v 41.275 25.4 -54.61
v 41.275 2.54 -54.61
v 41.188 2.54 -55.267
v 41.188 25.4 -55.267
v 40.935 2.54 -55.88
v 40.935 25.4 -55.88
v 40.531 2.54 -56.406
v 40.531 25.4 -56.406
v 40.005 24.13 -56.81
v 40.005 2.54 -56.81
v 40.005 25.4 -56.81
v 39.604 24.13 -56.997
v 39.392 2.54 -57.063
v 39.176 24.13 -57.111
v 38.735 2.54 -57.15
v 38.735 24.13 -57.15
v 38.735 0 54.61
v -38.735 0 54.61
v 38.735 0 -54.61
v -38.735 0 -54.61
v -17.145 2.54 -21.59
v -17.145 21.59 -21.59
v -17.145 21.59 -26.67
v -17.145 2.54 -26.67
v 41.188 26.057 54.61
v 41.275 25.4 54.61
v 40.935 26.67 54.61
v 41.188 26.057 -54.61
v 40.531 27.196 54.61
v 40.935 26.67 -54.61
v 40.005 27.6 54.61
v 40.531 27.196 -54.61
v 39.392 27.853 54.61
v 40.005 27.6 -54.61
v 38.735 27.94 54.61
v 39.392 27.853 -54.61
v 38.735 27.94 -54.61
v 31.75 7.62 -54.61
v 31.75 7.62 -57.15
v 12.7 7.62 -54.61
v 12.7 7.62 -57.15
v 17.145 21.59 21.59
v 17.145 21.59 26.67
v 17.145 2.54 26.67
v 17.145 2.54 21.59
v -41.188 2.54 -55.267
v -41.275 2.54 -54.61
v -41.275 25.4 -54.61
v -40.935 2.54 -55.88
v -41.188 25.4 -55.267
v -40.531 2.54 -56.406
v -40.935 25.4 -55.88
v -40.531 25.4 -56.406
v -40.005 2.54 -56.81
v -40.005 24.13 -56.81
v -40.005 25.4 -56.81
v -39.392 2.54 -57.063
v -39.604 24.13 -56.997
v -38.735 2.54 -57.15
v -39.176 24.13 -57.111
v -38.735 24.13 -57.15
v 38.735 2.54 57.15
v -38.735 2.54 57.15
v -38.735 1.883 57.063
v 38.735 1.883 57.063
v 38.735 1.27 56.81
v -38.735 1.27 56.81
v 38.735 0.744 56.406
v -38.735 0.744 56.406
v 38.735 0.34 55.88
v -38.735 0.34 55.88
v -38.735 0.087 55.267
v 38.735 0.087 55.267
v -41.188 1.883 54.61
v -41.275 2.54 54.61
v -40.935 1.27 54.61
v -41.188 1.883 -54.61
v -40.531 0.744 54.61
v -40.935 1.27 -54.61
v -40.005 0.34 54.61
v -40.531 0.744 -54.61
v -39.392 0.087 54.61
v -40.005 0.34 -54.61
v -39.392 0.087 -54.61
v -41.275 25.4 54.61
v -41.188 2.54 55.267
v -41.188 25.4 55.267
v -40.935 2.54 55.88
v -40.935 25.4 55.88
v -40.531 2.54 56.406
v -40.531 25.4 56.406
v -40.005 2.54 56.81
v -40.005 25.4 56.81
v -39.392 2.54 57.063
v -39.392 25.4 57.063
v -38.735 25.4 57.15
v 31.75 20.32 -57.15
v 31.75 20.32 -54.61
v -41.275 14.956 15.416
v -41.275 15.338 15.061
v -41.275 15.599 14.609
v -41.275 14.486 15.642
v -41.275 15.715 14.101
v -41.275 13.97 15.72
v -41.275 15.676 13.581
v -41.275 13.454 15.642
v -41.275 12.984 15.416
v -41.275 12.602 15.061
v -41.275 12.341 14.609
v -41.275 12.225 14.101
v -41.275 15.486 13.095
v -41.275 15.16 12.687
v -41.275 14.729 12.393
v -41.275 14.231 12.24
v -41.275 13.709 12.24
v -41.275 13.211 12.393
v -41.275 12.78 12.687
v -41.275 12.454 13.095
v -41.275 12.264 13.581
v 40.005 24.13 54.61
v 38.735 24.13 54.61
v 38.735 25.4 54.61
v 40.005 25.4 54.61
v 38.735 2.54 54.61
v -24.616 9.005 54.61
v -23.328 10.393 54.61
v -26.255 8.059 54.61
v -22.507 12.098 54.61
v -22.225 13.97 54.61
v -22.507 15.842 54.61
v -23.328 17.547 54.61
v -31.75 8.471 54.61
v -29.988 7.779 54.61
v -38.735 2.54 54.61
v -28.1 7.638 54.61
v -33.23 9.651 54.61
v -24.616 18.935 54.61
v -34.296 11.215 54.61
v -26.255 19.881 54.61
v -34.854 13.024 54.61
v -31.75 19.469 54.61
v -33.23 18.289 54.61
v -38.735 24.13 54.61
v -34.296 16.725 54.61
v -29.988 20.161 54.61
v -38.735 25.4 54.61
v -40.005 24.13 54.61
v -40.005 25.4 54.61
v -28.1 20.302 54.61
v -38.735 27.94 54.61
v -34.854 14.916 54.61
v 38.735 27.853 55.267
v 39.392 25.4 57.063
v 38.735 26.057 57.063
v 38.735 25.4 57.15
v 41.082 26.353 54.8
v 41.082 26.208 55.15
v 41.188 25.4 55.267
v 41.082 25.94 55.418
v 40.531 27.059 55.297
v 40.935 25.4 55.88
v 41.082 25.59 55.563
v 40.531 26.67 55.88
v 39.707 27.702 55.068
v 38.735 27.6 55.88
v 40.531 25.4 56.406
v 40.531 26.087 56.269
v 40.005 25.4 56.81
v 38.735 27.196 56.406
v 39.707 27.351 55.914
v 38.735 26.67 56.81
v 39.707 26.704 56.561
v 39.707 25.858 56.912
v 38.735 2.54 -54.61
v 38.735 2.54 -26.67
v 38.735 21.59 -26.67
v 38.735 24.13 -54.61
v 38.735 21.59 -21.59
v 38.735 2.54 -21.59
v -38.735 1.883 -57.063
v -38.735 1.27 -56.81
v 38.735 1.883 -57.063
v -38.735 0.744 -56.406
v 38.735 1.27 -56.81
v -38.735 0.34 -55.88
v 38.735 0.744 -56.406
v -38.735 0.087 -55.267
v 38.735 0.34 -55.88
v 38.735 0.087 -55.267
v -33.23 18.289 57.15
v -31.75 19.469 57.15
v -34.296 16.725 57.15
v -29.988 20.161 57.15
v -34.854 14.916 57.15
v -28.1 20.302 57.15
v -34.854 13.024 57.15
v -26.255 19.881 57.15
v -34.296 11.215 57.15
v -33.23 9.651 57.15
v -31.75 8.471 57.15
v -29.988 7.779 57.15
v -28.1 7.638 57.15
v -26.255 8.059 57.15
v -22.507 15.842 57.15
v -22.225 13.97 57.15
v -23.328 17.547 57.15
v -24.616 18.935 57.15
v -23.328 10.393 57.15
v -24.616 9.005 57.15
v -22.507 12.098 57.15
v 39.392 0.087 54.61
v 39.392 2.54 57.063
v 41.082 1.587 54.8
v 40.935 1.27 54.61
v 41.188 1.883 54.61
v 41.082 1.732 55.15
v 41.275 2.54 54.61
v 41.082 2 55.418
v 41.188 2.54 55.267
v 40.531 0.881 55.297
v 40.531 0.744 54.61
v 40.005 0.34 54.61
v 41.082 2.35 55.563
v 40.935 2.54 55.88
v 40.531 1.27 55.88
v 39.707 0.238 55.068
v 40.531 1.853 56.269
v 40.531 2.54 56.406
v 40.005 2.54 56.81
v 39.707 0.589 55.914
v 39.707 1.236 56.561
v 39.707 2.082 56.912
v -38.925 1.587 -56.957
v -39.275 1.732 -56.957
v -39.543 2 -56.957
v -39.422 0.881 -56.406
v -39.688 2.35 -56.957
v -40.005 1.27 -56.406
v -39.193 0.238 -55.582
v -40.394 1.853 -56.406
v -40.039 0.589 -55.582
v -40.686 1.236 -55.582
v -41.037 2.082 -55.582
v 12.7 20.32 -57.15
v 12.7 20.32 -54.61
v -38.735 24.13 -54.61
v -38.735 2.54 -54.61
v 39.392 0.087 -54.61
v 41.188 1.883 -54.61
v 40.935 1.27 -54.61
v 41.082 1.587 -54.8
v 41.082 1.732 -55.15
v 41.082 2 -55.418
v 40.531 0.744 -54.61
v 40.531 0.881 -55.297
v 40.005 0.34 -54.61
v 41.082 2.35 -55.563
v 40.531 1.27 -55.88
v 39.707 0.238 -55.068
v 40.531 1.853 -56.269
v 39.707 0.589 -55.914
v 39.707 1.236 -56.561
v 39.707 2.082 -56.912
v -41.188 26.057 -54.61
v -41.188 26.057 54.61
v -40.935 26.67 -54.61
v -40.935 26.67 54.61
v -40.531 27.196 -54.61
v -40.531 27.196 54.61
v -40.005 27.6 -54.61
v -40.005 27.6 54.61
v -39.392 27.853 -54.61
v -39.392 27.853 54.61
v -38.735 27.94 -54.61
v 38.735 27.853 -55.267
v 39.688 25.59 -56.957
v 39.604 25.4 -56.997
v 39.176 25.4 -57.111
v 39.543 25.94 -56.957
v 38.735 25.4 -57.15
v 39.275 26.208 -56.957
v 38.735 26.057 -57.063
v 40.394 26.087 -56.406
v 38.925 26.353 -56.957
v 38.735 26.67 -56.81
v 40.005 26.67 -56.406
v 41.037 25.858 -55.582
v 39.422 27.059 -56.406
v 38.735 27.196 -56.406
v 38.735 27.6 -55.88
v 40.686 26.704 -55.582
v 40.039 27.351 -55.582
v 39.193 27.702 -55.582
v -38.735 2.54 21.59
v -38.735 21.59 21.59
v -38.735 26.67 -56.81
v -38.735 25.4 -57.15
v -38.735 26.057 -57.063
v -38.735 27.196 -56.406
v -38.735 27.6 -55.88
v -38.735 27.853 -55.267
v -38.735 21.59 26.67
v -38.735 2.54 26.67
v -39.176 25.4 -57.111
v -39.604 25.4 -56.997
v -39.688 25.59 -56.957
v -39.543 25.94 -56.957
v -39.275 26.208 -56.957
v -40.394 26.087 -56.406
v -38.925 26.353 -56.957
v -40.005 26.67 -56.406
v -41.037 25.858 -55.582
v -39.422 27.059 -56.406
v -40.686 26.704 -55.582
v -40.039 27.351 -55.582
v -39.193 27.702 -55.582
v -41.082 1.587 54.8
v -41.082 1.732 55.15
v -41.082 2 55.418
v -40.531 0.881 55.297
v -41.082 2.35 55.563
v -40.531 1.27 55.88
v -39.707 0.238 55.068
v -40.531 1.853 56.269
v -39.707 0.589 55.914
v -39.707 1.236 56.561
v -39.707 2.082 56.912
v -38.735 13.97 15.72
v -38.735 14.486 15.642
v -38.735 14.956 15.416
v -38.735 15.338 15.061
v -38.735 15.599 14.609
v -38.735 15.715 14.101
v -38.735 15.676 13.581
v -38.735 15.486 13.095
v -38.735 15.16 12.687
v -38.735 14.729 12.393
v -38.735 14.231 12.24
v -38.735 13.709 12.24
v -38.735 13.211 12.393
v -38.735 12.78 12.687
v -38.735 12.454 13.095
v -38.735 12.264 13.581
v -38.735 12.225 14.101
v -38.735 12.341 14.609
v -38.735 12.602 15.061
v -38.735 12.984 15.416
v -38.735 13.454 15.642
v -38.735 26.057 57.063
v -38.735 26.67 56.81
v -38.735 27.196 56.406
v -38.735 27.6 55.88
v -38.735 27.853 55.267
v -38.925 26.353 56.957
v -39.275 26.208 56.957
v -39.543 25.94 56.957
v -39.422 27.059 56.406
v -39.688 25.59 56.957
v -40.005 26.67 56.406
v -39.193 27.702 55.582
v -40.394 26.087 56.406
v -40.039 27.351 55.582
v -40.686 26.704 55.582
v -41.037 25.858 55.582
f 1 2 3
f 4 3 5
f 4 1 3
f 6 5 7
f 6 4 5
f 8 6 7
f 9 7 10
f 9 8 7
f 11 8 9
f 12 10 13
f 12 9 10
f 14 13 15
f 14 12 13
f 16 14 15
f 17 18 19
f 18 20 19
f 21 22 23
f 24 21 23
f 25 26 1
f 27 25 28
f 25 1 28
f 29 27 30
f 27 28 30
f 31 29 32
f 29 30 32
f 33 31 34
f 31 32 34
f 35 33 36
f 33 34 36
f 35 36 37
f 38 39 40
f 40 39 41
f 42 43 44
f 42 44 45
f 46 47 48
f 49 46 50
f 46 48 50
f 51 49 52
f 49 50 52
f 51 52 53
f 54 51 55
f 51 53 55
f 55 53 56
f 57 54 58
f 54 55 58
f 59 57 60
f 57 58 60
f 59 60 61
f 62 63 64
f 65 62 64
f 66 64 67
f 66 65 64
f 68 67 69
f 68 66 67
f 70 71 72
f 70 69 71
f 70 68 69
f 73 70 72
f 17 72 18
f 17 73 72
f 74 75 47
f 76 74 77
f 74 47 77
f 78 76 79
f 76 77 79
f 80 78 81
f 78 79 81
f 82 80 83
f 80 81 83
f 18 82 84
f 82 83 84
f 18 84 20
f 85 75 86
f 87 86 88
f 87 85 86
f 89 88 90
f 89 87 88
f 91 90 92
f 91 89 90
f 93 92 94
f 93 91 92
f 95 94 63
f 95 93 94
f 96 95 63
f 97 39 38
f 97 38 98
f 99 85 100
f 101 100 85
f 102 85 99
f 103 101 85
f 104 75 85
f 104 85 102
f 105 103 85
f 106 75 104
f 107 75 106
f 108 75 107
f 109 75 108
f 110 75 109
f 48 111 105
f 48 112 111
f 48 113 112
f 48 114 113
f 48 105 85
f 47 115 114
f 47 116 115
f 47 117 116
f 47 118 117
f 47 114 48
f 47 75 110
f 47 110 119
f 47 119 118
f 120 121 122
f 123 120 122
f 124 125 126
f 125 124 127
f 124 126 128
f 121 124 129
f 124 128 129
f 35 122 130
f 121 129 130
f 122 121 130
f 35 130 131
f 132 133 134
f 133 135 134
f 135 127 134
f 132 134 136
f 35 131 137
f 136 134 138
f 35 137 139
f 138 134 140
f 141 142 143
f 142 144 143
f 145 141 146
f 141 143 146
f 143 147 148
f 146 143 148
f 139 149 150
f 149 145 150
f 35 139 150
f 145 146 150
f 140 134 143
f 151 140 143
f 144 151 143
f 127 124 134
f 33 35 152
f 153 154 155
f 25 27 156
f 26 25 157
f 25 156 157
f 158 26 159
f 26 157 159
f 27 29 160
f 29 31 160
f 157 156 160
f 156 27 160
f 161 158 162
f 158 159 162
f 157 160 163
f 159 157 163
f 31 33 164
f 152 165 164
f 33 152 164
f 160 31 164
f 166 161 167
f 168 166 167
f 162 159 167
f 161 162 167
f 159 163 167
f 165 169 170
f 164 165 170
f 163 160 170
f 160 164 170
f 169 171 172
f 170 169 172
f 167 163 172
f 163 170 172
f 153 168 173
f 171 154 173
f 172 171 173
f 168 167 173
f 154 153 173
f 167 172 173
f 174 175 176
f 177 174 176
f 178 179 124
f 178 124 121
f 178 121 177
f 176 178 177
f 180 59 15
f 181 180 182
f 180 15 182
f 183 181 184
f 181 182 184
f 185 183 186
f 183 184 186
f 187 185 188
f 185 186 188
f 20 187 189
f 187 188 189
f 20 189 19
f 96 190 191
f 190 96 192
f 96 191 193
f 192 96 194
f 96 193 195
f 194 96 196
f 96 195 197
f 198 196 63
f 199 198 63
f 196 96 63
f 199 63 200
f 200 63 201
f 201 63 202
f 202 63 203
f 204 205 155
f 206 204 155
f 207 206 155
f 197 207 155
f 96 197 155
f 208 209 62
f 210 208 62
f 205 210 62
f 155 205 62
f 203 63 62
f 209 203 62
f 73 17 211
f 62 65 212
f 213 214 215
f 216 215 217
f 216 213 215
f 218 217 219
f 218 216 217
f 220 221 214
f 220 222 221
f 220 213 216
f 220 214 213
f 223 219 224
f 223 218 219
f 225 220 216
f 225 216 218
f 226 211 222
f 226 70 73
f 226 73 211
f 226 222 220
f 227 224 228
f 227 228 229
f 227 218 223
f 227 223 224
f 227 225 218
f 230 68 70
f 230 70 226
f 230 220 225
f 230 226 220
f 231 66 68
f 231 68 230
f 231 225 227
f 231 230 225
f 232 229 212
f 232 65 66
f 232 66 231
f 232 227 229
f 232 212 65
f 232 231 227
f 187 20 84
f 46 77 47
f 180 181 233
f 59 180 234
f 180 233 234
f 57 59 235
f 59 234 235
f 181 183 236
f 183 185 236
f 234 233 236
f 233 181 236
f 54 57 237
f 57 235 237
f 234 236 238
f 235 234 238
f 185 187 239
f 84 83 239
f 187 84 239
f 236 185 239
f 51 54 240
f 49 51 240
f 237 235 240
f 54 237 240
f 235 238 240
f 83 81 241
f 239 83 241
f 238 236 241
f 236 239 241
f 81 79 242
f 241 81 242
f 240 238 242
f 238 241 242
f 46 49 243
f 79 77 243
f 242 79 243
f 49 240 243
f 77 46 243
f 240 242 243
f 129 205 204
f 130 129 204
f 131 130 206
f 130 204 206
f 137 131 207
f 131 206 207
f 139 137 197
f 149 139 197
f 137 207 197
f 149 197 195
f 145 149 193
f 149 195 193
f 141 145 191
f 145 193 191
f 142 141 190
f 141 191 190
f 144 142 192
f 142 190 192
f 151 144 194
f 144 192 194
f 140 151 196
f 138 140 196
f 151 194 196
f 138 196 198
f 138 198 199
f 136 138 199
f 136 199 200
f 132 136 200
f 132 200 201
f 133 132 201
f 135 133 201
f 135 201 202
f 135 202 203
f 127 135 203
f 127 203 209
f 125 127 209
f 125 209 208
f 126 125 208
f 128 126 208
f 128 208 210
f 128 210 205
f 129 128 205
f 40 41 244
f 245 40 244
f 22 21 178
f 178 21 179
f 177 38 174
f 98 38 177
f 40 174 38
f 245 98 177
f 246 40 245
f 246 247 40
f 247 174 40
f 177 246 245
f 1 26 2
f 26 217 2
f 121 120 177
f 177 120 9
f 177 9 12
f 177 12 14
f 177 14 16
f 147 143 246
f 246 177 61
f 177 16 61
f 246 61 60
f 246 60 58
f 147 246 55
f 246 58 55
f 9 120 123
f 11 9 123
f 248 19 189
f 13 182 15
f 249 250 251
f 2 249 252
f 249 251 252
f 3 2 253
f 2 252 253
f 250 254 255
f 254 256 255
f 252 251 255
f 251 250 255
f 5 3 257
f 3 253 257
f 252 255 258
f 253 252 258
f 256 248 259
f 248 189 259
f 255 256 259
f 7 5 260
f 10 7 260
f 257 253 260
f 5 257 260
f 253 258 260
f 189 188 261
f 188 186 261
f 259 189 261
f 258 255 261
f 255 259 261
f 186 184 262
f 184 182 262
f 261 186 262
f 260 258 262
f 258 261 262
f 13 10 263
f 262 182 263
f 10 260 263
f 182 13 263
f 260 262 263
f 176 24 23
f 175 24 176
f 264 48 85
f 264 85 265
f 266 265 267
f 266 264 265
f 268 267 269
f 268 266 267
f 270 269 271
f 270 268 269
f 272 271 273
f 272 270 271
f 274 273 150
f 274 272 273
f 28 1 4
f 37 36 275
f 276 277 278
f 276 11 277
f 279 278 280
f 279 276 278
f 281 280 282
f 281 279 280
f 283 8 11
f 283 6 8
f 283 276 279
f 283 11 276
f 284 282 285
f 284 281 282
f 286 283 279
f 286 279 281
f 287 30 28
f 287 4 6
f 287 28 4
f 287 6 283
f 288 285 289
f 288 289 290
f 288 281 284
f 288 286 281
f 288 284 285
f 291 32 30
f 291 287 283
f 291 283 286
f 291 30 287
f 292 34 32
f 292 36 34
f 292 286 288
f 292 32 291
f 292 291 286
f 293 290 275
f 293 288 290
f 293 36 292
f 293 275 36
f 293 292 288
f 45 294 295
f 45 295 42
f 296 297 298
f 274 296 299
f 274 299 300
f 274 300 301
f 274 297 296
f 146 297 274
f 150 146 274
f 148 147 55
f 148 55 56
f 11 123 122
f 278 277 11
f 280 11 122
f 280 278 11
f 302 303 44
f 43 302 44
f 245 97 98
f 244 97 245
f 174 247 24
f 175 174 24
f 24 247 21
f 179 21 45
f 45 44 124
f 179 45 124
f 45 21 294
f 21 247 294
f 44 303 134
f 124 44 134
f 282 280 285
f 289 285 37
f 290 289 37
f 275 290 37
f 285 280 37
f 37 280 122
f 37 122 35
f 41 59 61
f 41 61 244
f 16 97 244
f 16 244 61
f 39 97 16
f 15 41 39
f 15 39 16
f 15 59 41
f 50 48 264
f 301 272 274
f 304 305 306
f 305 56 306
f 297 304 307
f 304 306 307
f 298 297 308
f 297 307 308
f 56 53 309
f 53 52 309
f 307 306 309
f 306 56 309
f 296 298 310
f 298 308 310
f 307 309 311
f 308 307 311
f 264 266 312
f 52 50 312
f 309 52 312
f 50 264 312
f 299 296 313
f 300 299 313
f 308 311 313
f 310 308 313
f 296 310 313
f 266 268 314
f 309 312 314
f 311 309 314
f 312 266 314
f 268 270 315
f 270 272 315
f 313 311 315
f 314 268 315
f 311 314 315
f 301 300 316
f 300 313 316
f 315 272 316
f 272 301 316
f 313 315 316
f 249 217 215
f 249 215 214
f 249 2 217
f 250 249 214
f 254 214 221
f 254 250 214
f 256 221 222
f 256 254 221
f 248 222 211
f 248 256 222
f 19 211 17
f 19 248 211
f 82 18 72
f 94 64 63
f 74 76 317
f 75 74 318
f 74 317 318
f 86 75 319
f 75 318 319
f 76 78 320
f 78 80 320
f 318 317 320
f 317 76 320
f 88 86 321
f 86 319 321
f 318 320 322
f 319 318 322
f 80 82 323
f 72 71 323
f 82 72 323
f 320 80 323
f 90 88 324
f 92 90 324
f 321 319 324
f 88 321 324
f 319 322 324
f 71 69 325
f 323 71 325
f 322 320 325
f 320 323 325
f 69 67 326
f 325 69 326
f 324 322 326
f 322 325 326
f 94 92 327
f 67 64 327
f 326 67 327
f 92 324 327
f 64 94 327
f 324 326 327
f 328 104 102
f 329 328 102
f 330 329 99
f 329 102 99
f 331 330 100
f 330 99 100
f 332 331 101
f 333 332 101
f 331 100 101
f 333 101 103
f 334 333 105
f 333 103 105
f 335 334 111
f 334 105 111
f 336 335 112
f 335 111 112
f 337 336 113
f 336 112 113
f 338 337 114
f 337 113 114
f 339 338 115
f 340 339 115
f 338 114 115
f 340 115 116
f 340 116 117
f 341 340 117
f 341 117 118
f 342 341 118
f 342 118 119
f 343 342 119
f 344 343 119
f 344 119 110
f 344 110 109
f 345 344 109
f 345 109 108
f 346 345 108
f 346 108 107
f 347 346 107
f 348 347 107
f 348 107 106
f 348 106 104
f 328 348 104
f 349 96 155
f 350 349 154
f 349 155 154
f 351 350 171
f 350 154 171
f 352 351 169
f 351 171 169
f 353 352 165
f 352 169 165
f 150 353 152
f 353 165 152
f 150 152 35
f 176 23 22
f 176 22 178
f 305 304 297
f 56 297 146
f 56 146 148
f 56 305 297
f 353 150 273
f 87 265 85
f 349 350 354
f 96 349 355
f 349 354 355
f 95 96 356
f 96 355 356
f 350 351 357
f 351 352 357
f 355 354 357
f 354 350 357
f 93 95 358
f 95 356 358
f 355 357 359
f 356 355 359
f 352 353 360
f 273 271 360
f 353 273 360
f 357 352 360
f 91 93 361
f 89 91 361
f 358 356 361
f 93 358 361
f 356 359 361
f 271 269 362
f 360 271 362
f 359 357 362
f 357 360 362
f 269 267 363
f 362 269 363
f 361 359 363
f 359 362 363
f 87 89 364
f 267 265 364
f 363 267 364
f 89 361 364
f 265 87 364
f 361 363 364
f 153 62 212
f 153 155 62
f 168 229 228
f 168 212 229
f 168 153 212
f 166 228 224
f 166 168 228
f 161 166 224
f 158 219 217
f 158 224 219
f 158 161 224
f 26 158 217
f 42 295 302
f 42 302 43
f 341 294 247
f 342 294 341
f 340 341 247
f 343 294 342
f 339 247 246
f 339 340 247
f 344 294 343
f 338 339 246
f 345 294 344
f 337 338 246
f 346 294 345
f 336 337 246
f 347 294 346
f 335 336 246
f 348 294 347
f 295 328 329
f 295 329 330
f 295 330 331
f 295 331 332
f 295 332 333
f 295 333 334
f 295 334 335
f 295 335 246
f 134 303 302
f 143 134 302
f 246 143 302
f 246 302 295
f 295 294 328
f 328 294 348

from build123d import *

# Parameters (mm, degrees)
SKETCH1_W           = 82.55
SKETCH1_H           = 114.3
BOSS_EXTRUDE1_DEPTH = 27.94
FILLET1_R           = 2.54
SHELL2_START        = -38.735
SHELL2_OUTLINE_W    = 25.4
SHELL2_OUTLINE_H    = 109.22
SHELL2_DEPTH        = 77.47
SKETCH2_W           = 55.88
SKETCH2_H           = 5.08
BOSS_EXTRUDE2_DEPTH = 19.05
CUT_EXTRUDE1_REACH  = 106.217
SKETCH3_R           = 1.75
CUT_EXTRUDE2_REACH  = 126.695
SKETCH4_R           = 6.35
CUT_EXTRUDE3_REACH  = 126.695
SKETCH5_W           = 19.05
SKETCH5_H           = 12.7
SKETCH6_W           = 38.735
SKETCH6_H           = 2.54
SKETCH6_H_2         = 1.27
SKETCH6_W_2         = 1.27
CUT_EXTRUDE4_DEPTH  = 111.76


# Read off the part's stored shape, not the designer's step: Shell2
with BuildPart() as part:
    # Sketch1 → Boss-Extrude1 (new body)
    with BuildSketch(Plane(origin=(0, 0, 0), x_dir=(1, 0, 0), z_dir=(0, 1, 0))):
        Rectangle(SKETCH1_W, SKETCH1_H)
    extrude(amount=BOSS_EXTRUDE1_DEPTH)

    # Fillet1
    fillet1_edges = [part.edges().sort_by_distance(p)[0] for p in [
        (-41.275, 27.94, 0),
        (0, 27.94, 57.15),
        (41.275, 27.94, 0),
        (0, 0, 57.15),
        (-41.275, 0, 0),
        (0, 0, -57.15),
        (41.275, 0, 0),
        (41.275, 13.97, 57.15),
        (-41.275, 13.97, 57.15),
        (-41.275, 13.97, -57.15),
        (41.275, 13.97, -57.15),
        (0, 27.94, -57.15),
    ]]
    fillet(fillet1_edges, radius=FILLET1_R)

    # Shell2 outline → Shell2 (cut)
    with BuildSketch(Plane.YZ.offset(SHELL2_START)):
        with Locations((15.24, 0)):
            Rectangle(SHELL2_OUTLINE_W, SHELL2_OUTLINE_H)
    extrude(amount=SHELL2_DEPTH, mode=Mode.SUBTRACT)

    # Sketch2 → Boss-Extrude2 (add)
    with BuildSketch(Plane(origin=(0, 2.54, 0), x_dir=(1, 0, 0), z_dir=(0, 1, 0))):
        with Locations((-10.795, -24.13)):
            Rectangle(SKETCH2_W, SKETCH2_H)
        with Locations((10.795, 24.13)):
            Rectangle(SKETCH2_W, SKETCH2_H)
    extrude(amount=BOSS_EXTRUDE2_DEPTH)

    # Sketch3 → Cut-Extrude1 (cut, up to next)
    with BuildSketch(Plane.ZY.offset(41.275), mode=Mode.PRIVATE) as cut_extrude1_sk1:
        with Locations((13.97, 13.97)):
            Circle(SKETCH3_R)
    cut_extrude1_tool1 = extrude(cut_extrude1_sk1.sketch, amount=-CUT_EXTRUDE1_REACH, mode=Mode.PRIVATE) & part.part
    add(cut_extrude1_tool1.solids().sort_by_distance((-41.275, 13.97, 13.97))[0], mode=Mode.SUBTRACT)

    # Sketch4 → Cut-Extrude2 (cut, up to next)
    with BuildSketch(Plane.XY.offset(57.15), mode=Mode.PRIVATE) as cut_extrude2_sk1:
        with Locations((-28.575, 13.97)):
            Circle(SKETCH4_R)
    cut_extrude2_tool1 = extrude(cut_extrude2_sk1.sketch, amount=-CUT_EXTRUDE2_REACH, mode=Mode.PRIVATE) & part.part
    add(cut_extrude2_tool1.solids().sort_by_distance((-28.575, 13.97, 57.15))[0], mode=Mode.SUBTRACT)

    # Sketch5 → Cut-Extrude3 (cut, up to next)
    with BuildSketch(Plane(origin=(0, 0, -57.15), x_dir=(-1, 0, 0), z_dir=(0, 0, -1)), mode=Mode.PRIVATE) as cut_extrude3_sk1:
        with Locations((-22.225, 13.97)):
            Rectangle(SKETCH5_W, SKETCH5_H)
    cut_extrude3_tool1 = extrude(cut_extrude3_sk1.sketch, amount=-CUT_EXTRUDE3_REACH, mode=Mode.PRIVATE) & part.part
    add(cut_extrude3_tool1.solids().sort_by_distance((22.225, 13.97, -57.15))[0], mode=Mode.SUBTRACT)

    # Sketch6 → Cut-Extrude4 (cut)
    with BuildSketch(Plane(origin=(0, 0, -57.15), x_dir=(-1, 0, 0), z_dir=(0, 0, -1))):
        with Locations((-19.3675, 26.67)):
            Rectangle(SKETCH6_W, SKETCH6_H)
        with Locations((-19.3675, 24.765)):
            Rectangle(SKETCH6_W, SKETCH6_H_2)
        with Locations((-39.37, 24.765)):
            Rectangle(SKETCH6_W_2, SKETCH6_H_2)
        with Locations((39.37, 24.765)):
            Rectangle(SKETCH6_W_2, SKETCH6_H_2)
        with Locations((19.3675, 26.67)):
            Rectangle(SKETCH6_W, SKETCH6_H)
        with Locations((19.3675, 24.765)):
            Rectangle(SKETCH6_W, SKETCH6_H_2)
    extrude(amount=-CUT_EXTRUDE4_DEPTH, mode=Mode.SUBTRACT)


solid = part.part
